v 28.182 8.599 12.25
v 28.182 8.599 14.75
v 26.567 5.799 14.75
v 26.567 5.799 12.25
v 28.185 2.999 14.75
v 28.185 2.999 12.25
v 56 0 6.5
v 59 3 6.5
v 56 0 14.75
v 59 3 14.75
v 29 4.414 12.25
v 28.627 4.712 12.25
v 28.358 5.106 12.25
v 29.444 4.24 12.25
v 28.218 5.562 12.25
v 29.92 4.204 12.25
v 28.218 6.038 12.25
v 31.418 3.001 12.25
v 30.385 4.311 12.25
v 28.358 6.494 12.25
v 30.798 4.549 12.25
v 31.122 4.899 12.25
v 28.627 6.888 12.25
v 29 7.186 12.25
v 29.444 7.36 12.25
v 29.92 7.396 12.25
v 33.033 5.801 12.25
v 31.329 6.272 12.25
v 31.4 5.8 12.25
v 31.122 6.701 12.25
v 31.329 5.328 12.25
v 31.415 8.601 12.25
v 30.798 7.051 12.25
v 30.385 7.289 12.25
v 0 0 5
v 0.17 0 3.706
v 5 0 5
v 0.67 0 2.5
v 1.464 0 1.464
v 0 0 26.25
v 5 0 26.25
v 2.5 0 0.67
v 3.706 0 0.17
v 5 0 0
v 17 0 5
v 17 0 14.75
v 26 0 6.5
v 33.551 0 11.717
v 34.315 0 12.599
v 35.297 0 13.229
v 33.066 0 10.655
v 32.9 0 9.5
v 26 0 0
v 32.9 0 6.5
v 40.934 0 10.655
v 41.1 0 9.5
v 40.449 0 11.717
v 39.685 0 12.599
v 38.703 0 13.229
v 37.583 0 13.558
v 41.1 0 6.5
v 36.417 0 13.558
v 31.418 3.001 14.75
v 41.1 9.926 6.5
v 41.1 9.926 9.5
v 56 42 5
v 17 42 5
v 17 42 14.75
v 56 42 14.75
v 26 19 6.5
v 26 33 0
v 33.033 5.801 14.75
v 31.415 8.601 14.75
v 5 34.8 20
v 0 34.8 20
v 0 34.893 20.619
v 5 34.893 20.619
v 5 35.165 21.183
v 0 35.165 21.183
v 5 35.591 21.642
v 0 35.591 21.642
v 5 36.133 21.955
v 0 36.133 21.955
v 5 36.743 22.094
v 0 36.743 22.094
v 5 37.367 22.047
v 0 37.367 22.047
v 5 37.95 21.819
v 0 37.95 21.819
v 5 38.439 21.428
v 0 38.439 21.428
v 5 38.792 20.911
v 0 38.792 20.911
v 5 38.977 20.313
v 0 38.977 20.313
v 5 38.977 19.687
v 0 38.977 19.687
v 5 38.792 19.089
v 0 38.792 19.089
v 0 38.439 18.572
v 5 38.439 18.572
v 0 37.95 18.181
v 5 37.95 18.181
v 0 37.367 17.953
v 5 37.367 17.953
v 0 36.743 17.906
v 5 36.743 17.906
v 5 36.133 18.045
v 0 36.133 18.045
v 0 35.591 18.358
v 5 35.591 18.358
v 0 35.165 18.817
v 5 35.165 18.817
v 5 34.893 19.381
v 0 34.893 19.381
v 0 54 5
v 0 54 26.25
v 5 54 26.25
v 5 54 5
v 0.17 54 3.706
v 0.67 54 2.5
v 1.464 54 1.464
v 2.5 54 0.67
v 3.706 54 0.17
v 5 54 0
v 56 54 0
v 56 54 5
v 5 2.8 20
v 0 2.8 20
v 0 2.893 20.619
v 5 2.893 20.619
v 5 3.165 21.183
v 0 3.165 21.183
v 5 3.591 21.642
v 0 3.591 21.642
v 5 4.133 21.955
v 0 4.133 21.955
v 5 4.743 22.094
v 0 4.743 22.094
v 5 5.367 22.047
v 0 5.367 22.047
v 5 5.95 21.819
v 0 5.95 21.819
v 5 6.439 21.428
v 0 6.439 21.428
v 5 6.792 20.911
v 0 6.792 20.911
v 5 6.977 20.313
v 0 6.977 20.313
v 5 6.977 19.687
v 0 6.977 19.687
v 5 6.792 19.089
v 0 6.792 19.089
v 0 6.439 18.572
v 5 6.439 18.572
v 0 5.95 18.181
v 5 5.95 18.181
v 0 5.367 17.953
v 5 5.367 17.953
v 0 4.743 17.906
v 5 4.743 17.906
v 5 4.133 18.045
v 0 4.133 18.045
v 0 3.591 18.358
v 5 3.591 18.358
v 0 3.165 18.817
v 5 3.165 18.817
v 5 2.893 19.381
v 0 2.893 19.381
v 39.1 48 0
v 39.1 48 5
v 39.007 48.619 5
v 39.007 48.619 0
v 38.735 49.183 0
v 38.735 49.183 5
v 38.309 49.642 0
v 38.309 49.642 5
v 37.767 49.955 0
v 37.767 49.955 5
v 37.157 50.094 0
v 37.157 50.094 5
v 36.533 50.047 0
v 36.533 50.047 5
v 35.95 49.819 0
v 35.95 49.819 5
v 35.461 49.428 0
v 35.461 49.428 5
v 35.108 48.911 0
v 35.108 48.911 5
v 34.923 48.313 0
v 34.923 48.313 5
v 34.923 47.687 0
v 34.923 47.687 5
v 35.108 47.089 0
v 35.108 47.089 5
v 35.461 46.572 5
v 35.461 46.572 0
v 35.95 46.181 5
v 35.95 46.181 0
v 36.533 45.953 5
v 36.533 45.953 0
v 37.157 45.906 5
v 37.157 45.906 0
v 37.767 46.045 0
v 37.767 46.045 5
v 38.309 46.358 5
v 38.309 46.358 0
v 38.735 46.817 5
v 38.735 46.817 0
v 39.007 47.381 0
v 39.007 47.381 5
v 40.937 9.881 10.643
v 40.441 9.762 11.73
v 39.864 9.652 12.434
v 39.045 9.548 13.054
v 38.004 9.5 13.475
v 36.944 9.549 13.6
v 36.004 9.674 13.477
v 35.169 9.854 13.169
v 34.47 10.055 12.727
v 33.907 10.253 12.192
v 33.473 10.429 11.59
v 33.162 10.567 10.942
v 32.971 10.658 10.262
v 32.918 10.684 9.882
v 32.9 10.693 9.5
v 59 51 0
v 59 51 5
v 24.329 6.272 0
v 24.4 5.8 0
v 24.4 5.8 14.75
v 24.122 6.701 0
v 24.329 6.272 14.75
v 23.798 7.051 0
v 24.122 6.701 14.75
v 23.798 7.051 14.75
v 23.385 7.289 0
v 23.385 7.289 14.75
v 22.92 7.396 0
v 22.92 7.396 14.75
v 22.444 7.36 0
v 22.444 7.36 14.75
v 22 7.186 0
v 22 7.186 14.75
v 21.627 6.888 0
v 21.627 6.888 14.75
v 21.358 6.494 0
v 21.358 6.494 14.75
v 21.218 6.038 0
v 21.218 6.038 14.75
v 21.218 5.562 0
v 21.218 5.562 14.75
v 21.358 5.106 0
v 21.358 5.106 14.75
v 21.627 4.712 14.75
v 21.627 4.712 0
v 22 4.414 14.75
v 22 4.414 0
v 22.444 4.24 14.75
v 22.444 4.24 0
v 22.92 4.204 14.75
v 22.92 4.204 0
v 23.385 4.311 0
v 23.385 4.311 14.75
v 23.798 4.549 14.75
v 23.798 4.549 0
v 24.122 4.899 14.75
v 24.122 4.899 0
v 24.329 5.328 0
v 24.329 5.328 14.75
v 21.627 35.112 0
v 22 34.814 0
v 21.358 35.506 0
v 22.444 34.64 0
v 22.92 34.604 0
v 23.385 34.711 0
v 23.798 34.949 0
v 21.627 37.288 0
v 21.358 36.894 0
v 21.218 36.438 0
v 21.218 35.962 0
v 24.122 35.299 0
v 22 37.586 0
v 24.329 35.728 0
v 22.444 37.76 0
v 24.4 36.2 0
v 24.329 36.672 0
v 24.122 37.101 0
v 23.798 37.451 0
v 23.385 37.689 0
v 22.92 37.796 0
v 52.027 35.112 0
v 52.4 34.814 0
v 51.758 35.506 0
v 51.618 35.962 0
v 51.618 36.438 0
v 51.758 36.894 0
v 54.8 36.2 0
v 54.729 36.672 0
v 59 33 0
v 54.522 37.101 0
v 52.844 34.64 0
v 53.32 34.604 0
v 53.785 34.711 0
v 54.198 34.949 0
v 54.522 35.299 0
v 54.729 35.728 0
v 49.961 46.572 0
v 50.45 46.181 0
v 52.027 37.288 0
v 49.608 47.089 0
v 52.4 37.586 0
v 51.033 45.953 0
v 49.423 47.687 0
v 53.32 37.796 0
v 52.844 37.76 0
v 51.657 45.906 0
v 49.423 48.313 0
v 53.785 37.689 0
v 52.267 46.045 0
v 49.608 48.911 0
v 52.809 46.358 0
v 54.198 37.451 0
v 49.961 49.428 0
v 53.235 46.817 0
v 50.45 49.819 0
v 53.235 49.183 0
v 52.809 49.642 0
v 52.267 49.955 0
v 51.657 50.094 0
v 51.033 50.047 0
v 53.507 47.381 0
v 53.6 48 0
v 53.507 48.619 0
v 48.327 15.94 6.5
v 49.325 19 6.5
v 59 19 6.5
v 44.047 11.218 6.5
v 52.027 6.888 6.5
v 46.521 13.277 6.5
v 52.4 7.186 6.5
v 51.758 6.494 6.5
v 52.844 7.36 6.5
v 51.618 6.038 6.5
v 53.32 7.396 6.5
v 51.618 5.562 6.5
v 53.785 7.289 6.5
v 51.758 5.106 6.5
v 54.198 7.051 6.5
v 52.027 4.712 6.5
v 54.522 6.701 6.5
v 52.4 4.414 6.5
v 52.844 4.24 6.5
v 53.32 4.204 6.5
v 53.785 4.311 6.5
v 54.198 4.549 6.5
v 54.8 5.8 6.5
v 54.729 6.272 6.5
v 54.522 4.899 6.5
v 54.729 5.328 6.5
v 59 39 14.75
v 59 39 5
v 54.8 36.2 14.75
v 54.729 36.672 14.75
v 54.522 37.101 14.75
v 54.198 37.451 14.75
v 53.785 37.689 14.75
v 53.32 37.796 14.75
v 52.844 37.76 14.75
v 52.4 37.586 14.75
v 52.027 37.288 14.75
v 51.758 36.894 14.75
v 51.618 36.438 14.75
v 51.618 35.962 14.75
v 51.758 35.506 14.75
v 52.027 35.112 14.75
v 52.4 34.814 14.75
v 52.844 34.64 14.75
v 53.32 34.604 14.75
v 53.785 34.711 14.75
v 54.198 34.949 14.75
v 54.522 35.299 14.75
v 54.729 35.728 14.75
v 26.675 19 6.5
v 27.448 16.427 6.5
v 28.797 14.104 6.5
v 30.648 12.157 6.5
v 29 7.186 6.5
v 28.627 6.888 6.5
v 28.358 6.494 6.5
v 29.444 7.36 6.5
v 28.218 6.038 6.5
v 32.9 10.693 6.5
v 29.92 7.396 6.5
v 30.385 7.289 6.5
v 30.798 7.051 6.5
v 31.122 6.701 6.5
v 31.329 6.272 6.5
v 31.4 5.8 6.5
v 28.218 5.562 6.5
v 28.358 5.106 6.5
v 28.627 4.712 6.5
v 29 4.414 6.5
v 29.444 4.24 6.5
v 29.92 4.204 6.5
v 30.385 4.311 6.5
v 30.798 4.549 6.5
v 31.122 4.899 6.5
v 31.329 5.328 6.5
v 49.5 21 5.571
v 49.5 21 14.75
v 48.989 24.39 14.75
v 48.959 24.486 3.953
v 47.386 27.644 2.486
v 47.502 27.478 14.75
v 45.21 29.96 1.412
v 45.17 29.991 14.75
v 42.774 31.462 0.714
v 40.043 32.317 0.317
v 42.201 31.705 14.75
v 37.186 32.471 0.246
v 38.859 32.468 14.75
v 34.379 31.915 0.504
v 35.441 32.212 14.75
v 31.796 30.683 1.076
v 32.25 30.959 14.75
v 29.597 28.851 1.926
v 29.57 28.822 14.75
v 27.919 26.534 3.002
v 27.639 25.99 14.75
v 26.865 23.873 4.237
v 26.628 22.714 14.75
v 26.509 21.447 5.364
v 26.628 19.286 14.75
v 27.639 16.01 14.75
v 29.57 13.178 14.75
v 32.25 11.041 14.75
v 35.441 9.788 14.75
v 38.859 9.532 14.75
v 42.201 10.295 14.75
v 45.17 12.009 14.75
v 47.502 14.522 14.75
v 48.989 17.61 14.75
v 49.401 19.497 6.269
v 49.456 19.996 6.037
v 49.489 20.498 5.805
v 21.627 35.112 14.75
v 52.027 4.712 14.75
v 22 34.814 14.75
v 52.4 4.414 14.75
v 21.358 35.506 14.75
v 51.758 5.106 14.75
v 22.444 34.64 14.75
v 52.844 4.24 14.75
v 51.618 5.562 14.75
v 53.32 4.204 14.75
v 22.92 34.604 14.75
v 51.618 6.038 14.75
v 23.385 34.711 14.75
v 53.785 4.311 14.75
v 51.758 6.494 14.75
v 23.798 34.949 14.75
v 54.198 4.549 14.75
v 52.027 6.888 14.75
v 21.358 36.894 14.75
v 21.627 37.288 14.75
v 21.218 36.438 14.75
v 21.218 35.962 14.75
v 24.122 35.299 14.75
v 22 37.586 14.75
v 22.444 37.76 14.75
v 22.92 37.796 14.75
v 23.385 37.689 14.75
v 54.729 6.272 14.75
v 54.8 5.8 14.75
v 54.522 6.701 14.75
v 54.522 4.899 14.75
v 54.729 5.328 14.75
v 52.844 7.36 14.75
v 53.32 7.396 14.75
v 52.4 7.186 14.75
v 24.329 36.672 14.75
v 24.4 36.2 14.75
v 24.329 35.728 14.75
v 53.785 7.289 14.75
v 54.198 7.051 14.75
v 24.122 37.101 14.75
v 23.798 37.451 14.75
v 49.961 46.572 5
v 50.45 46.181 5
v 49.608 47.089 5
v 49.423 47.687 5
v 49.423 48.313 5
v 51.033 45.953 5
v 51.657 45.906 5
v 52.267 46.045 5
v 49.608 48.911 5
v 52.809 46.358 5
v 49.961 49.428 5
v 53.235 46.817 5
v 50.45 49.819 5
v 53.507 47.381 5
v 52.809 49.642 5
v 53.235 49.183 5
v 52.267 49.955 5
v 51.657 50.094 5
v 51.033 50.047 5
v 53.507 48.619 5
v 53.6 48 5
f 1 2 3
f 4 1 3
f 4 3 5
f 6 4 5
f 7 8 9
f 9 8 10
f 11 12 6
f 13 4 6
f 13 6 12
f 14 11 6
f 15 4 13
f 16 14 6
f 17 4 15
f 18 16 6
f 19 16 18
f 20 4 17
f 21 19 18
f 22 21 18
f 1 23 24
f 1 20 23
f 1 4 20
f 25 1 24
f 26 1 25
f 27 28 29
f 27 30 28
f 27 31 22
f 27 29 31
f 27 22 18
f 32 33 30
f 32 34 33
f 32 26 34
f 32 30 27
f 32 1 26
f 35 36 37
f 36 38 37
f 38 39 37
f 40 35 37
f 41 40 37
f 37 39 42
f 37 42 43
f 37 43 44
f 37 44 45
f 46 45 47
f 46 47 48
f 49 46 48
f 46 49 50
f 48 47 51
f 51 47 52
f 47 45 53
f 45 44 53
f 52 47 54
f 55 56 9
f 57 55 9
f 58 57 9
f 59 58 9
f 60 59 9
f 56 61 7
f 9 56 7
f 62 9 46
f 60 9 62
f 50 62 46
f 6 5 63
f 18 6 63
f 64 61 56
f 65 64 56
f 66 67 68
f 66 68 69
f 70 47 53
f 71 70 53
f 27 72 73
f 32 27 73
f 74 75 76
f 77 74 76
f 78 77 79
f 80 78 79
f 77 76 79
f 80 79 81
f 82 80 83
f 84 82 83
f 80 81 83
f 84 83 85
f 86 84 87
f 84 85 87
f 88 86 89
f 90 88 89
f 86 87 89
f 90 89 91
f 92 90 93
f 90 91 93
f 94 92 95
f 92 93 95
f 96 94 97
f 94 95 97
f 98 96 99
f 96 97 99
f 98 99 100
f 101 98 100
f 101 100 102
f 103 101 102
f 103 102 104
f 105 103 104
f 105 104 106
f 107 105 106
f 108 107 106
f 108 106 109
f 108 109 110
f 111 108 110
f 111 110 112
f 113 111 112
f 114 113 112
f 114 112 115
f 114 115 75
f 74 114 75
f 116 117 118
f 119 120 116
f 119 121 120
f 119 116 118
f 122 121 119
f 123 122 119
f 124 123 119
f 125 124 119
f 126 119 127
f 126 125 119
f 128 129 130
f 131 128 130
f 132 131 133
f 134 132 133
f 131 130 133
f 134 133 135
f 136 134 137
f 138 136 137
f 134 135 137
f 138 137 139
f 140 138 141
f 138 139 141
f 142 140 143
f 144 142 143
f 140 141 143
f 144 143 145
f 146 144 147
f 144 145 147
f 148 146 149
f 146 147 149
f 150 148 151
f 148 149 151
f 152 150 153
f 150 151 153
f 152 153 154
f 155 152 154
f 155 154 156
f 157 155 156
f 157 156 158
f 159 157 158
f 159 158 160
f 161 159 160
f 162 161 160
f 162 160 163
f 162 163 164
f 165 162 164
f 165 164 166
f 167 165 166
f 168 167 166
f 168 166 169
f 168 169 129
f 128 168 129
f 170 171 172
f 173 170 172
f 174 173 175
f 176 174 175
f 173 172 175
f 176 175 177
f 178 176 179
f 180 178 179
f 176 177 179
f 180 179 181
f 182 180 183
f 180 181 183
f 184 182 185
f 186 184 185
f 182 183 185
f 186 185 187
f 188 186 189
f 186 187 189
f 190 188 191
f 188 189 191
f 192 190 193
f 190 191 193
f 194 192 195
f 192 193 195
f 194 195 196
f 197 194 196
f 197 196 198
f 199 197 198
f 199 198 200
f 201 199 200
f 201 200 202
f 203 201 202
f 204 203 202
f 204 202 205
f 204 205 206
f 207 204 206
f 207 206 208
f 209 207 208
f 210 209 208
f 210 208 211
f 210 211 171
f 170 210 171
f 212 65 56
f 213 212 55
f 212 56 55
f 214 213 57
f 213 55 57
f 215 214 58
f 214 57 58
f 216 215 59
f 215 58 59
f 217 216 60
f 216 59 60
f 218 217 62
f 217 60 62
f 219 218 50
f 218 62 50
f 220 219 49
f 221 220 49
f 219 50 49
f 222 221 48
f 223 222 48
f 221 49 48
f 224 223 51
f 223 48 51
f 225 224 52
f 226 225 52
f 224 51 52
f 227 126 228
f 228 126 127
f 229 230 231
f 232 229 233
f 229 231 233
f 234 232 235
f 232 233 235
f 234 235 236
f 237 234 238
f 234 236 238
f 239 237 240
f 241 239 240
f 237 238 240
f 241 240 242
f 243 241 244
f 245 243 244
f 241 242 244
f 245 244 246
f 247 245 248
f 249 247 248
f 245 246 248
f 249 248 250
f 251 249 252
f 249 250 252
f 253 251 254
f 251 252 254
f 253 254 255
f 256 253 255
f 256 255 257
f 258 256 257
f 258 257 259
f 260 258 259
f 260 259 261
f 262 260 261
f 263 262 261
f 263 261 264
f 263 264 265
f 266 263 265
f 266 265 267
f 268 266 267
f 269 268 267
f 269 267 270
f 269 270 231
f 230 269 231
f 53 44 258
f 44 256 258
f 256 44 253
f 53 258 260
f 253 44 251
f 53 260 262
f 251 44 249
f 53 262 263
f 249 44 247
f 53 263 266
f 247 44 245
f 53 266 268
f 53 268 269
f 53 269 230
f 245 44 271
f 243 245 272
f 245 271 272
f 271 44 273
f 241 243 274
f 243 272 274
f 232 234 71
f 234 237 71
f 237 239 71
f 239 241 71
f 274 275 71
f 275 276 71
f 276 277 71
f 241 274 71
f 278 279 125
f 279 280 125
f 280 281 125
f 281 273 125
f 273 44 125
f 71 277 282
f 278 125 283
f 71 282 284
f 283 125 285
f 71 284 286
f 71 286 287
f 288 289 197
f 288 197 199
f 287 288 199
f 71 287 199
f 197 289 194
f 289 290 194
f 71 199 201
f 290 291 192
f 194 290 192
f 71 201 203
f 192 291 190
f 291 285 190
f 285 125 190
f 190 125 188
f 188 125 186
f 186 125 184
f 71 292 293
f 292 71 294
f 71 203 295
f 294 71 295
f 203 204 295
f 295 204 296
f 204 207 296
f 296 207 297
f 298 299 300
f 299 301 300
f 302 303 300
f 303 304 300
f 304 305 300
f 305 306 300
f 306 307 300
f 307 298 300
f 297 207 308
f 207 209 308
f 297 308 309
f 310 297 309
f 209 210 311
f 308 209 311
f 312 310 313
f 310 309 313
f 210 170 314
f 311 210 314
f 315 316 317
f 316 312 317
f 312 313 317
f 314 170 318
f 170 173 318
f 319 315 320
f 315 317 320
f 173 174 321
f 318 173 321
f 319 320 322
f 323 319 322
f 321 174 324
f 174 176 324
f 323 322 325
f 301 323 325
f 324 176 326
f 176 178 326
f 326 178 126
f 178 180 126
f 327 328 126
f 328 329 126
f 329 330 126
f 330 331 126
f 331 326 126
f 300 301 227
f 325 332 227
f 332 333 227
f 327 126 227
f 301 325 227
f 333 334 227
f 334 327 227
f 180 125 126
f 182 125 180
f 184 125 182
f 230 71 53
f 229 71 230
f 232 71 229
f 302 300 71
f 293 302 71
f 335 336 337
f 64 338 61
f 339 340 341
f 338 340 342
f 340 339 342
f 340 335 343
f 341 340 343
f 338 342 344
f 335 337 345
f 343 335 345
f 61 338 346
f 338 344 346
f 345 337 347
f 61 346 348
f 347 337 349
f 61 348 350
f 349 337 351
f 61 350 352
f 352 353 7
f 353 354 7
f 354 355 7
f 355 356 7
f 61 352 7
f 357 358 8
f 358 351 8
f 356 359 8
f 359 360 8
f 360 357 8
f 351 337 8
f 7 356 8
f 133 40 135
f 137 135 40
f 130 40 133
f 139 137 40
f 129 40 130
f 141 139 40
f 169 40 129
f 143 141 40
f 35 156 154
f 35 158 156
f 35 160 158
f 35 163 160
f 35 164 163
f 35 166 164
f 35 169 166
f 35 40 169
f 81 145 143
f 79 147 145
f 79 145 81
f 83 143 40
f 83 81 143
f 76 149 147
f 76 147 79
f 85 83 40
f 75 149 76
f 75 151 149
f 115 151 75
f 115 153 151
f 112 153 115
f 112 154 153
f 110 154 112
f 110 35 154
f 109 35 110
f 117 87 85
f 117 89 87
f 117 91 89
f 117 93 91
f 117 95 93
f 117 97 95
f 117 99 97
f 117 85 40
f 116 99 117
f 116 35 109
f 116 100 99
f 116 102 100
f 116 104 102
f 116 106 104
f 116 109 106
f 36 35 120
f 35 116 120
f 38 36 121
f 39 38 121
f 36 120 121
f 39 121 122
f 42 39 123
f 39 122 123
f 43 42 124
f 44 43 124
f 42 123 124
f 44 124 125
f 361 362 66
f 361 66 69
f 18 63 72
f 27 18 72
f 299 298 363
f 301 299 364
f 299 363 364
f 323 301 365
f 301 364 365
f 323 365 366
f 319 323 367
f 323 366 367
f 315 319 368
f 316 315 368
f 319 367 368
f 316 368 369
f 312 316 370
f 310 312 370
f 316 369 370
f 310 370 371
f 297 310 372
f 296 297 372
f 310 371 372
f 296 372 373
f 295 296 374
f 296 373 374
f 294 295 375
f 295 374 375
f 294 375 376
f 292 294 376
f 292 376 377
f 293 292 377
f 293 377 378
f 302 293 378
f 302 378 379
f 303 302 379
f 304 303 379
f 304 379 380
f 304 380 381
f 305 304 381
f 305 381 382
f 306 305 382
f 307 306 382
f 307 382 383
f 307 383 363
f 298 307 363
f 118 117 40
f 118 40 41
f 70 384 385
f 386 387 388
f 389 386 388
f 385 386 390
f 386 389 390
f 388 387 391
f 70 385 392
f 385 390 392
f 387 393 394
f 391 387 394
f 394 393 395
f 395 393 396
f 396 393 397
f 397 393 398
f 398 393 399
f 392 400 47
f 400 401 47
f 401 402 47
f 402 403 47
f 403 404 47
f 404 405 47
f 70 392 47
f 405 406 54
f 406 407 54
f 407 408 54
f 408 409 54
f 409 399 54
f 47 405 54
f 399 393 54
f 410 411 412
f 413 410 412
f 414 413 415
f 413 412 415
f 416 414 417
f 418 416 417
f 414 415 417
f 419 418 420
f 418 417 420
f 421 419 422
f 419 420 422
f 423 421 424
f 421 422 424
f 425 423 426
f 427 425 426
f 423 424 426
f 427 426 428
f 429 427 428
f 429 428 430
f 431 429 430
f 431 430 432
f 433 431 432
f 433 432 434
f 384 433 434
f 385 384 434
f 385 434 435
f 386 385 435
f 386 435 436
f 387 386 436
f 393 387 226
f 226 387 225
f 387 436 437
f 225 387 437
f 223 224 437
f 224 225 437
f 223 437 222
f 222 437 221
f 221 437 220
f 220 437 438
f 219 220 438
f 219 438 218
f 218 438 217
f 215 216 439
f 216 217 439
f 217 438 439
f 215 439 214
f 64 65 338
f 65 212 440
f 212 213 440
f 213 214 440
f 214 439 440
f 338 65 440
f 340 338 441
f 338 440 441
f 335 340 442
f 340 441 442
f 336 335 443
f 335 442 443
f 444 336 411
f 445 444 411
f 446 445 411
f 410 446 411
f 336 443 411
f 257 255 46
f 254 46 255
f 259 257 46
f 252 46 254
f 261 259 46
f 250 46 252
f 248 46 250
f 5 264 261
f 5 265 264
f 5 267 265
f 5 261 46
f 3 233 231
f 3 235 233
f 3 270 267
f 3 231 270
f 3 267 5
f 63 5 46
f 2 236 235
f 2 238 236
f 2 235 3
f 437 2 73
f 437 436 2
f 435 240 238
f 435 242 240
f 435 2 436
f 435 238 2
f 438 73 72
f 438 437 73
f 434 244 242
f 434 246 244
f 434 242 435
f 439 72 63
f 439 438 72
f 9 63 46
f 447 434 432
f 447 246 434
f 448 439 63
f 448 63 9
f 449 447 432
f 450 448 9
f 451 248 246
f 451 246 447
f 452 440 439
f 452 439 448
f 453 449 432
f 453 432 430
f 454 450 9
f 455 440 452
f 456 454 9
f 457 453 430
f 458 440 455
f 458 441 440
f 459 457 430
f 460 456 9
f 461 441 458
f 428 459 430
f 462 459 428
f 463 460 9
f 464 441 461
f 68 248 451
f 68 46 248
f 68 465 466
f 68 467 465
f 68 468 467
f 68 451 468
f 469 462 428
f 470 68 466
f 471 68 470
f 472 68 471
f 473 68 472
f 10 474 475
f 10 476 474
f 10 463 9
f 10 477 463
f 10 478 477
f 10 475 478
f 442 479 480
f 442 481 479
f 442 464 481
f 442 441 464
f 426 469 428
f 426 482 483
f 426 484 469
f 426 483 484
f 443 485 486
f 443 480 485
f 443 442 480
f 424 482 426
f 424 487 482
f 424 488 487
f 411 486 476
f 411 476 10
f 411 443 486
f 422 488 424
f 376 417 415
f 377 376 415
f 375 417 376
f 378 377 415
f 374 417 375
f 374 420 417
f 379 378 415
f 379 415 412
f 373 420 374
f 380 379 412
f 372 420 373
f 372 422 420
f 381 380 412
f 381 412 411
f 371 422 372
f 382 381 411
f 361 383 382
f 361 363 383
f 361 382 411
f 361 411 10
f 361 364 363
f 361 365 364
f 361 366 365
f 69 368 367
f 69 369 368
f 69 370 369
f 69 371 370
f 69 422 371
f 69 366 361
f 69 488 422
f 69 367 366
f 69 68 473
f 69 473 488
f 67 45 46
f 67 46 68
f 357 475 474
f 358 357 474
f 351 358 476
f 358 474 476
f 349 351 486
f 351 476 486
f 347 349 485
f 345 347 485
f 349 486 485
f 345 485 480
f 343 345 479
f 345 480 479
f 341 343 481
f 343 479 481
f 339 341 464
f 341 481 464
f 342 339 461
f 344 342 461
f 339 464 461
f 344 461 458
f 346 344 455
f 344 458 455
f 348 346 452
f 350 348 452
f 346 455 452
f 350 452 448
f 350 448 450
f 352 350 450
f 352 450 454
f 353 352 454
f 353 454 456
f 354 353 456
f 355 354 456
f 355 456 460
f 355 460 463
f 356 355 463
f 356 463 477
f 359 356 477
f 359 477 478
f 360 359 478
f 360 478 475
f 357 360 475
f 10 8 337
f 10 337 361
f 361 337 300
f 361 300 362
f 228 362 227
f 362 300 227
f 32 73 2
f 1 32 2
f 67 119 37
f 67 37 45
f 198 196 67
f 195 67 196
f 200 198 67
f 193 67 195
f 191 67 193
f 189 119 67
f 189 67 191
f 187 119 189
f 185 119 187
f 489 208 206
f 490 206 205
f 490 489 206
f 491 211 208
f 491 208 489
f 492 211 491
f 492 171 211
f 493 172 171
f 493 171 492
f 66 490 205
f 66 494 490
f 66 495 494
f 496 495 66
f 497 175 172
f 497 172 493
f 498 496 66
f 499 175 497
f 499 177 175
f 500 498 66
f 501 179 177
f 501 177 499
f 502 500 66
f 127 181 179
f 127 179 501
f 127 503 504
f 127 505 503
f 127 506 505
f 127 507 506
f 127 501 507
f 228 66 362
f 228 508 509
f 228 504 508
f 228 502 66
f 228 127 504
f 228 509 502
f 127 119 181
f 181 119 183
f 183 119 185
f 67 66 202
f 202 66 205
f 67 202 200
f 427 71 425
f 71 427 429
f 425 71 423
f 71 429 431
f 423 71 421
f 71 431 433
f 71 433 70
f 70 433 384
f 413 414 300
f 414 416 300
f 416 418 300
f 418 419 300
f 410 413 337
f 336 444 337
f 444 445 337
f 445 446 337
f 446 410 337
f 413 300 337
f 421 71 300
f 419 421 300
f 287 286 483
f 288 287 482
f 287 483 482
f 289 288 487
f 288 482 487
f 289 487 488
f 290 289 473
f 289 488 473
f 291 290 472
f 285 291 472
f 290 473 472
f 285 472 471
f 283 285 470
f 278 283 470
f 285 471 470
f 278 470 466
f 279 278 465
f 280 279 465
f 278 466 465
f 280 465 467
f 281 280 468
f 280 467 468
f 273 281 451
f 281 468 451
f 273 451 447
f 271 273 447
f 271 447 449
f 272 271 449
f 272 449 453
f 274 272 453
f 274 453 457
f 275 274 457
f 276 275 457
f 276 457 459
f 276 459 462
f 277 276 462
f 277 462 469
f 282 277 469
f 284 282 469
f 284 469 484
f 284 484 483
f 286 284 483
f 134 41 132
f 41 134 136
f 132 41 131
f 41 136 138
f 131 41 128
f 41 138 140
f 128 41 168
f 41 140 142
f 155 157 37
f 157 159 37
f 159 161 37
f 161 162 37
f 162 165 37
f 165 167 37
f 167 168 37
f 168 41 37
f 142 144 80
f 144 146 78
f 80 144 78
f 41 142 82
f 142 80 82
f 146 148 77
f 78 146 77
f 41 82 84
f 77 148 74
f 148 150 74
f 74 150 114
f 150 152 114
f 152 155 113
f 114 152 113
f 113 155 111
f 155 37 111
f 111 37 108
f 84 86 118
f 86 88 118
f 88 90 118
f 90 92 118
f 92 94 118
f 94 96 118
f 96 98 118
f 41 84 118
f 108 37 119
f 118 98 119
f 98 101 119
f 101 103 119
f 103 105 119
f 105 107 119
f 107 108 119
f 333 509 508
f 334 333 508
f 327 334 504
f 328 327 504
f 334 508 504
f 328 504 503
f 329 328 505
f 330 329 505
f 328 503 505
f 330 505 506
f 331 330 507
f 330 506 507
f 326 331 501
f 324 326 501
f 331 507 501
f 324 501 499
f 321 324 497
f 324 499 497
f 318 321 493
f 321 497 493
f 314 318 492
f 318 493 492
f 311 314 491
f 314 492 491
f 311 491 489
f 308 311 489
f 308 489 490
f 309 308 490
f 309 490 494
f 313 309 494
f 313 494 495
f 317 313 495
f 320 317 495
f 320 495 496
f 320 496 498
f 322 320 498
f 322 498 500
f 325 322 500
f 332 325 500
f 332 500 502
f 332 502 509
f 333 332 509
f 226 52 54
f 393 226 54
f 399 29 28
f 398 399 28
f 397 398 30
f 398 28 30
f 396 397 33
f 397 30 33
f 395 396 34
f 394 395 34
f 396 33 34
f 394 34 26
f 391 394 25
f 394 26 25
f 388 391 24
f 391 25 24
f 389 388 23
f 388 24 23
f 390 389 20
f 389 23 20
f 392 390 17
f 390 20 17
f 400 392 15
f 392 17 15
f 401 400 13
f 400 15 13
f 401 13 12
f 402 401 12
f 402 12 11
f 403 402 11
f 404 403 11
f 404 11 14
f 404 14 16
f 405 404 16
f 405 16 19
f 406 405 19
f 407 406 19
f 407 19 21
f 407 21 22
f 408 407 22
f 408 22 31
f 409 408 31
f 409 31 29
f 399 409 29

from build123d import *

# Parameters (mm, degrees)
F0_W      = 59
F0_H      = 54
F1_DEPTH  = 5
F2_W      = 5
F2_H      = 54
F3_DEPTH  = 21.25
F4_W      = 42
F4_H      = 42
F5_DEPTH  = 9.75
F7_DEPTH  = 33
F8_R      = 1.6
F8_R_2    = 11.5
F9_DEPTH  = 14.751
F10_R     = 2.1
F11_DEPTH = 5.001
F12_SIZE  = 3
F13_R     = 5
F14_R     = 1.6
F15_DEPTH = 2.5
F16_R     = 2.1
F17_DEPTH = 59.001
F19_DEPTH = 10.6937211186


with BuildPart() as f1:
    # F0 (on Top) → F1 (new body)
    with BuildSketch(Plane.XY):
        with Locations((29.5, 27)):
            Rectangle(F0_W, F0_H)
    extrude(amount=F1_DEPTH)

    # F2 (on face) → F3 (join)
    with BuildSketch(Plane.XY.offset(5)):
        with Locations((2.5, 27)):
            Rectangle(F2_W, F2_H)
    extrude(amount=F3_DEPTH)

    # F4 (on face) → F5 (join)
    with BuildSketch(Plane.XY.offset(5)):
        with Locations((38, 21)):
            Rectangle(F4_W, F4_H)
    extrude(amount=F5_DEPTH)

    # F6 (on face) → F7 (cut)
    with BuildSketch(Plane.YZ.offset(59)):
        Polygon((0, 6.5), (0, 0), (33, 0), (19, 6.5), align=None)
    extrude(amount=-F7_DEPTH, mode=Mode.SUBTRACT)

    # F8 (on face) → F9 (cut, through all)
    with BuildSketch(Plane.XY.offset(14.75)):
        with Locations((22.8, 36.2)):
            Circle(F8_R)
        with Locations((38, 21)):
            Circle(F8_R_2)
        with Locations((53.2, 36.2)):
            Circle(F8_R)
        with Locations((22.8, 5.8)):
            Circle(F8_R)
        with Locations((53.2, 5.8)):
            Circle(F8_R)
        with Locations((29.8, 5.8)):
            Circle(F8_R)
    extrude(amount=-F9_DEPTH, mode=Mode.SUBTRACT)

    # F10 (on face) → F11 (cut, through all)
    with BuildSketch(Plane.XY.offset(5)):
        with Locations((37, 48)):
            Circle(F10_R)
        with Locations((51.5, 48)):
            Circle(F10_R)
    extrude(amount=-F11_DEPTH, mode=Mode.SUBTRACT)

    # F12
    f12_edges = [f1.edges().sort_by_distance(p)[0] for p in [
        (59, 54, 2.5),
        (59, 42, 9.875),
        (59, 0, 10.625),
    ]]
    chamfer(f12_edges, length=F12_SIZE)

    # F13
    f13_edges = [f1.edges().sort_by_distance(p)[0] for p in [
        (0, 27, 0),
    ]]
    fillet(f13_edges, radius=F13_R)

    # F14 (on face) → F15 (cut)
    with BuildSketch(Plane.XY.offset(14.75)):
        Polygon((31.417729554, 3.0006632601), (33.0331615075, 5.8013265202), (31.4154319535, 8.6006632601), (28.182270446, 8.5993367399), (26.5668384925, 5.7986734798), (28.1845680465, 2.9993367399), align=None)
        with Locations((29.8, 5.8)):
            Circle(F14_R, mode=Mode.SUBTRACT)
    extrude(amount=-F15_DEPTH, mode=Mode.SUBTRACT)

    # F16 (on face) → F17 (cut, through all)
    with BuildSketch(Plane(origin=(0, 0, 0), x_dir=(0, -1, 0), z_dir=(-1, 0, 0))):
        with Locations((-36.9, 20)):
            Circle(F16_R)
        with Locations((-4.9, 20)):
            Circle(F16_R)
    extrude(amount=-F17_DEPTH, mode=Mode.SUBTRACT)

    # F18 (on face) → F19 (cut, through all)
    with BuildSketch(Plane.XZ):
        with BuildLine():
            Line((32.9, 9.5), (32.9, 6.5))
            Line((32.9, 6.5), (41.1, 6.5))
            Line((41.1, 6.5), (41.1, 9.5))
            ThreePointArc((41.1, 9.5), (37, 13.6), (32.9, 9.5))
        make_face()
    extrude(amount=-F19_DEPTH, mode=Mode.SUBTRACT)


solid = f1.part
